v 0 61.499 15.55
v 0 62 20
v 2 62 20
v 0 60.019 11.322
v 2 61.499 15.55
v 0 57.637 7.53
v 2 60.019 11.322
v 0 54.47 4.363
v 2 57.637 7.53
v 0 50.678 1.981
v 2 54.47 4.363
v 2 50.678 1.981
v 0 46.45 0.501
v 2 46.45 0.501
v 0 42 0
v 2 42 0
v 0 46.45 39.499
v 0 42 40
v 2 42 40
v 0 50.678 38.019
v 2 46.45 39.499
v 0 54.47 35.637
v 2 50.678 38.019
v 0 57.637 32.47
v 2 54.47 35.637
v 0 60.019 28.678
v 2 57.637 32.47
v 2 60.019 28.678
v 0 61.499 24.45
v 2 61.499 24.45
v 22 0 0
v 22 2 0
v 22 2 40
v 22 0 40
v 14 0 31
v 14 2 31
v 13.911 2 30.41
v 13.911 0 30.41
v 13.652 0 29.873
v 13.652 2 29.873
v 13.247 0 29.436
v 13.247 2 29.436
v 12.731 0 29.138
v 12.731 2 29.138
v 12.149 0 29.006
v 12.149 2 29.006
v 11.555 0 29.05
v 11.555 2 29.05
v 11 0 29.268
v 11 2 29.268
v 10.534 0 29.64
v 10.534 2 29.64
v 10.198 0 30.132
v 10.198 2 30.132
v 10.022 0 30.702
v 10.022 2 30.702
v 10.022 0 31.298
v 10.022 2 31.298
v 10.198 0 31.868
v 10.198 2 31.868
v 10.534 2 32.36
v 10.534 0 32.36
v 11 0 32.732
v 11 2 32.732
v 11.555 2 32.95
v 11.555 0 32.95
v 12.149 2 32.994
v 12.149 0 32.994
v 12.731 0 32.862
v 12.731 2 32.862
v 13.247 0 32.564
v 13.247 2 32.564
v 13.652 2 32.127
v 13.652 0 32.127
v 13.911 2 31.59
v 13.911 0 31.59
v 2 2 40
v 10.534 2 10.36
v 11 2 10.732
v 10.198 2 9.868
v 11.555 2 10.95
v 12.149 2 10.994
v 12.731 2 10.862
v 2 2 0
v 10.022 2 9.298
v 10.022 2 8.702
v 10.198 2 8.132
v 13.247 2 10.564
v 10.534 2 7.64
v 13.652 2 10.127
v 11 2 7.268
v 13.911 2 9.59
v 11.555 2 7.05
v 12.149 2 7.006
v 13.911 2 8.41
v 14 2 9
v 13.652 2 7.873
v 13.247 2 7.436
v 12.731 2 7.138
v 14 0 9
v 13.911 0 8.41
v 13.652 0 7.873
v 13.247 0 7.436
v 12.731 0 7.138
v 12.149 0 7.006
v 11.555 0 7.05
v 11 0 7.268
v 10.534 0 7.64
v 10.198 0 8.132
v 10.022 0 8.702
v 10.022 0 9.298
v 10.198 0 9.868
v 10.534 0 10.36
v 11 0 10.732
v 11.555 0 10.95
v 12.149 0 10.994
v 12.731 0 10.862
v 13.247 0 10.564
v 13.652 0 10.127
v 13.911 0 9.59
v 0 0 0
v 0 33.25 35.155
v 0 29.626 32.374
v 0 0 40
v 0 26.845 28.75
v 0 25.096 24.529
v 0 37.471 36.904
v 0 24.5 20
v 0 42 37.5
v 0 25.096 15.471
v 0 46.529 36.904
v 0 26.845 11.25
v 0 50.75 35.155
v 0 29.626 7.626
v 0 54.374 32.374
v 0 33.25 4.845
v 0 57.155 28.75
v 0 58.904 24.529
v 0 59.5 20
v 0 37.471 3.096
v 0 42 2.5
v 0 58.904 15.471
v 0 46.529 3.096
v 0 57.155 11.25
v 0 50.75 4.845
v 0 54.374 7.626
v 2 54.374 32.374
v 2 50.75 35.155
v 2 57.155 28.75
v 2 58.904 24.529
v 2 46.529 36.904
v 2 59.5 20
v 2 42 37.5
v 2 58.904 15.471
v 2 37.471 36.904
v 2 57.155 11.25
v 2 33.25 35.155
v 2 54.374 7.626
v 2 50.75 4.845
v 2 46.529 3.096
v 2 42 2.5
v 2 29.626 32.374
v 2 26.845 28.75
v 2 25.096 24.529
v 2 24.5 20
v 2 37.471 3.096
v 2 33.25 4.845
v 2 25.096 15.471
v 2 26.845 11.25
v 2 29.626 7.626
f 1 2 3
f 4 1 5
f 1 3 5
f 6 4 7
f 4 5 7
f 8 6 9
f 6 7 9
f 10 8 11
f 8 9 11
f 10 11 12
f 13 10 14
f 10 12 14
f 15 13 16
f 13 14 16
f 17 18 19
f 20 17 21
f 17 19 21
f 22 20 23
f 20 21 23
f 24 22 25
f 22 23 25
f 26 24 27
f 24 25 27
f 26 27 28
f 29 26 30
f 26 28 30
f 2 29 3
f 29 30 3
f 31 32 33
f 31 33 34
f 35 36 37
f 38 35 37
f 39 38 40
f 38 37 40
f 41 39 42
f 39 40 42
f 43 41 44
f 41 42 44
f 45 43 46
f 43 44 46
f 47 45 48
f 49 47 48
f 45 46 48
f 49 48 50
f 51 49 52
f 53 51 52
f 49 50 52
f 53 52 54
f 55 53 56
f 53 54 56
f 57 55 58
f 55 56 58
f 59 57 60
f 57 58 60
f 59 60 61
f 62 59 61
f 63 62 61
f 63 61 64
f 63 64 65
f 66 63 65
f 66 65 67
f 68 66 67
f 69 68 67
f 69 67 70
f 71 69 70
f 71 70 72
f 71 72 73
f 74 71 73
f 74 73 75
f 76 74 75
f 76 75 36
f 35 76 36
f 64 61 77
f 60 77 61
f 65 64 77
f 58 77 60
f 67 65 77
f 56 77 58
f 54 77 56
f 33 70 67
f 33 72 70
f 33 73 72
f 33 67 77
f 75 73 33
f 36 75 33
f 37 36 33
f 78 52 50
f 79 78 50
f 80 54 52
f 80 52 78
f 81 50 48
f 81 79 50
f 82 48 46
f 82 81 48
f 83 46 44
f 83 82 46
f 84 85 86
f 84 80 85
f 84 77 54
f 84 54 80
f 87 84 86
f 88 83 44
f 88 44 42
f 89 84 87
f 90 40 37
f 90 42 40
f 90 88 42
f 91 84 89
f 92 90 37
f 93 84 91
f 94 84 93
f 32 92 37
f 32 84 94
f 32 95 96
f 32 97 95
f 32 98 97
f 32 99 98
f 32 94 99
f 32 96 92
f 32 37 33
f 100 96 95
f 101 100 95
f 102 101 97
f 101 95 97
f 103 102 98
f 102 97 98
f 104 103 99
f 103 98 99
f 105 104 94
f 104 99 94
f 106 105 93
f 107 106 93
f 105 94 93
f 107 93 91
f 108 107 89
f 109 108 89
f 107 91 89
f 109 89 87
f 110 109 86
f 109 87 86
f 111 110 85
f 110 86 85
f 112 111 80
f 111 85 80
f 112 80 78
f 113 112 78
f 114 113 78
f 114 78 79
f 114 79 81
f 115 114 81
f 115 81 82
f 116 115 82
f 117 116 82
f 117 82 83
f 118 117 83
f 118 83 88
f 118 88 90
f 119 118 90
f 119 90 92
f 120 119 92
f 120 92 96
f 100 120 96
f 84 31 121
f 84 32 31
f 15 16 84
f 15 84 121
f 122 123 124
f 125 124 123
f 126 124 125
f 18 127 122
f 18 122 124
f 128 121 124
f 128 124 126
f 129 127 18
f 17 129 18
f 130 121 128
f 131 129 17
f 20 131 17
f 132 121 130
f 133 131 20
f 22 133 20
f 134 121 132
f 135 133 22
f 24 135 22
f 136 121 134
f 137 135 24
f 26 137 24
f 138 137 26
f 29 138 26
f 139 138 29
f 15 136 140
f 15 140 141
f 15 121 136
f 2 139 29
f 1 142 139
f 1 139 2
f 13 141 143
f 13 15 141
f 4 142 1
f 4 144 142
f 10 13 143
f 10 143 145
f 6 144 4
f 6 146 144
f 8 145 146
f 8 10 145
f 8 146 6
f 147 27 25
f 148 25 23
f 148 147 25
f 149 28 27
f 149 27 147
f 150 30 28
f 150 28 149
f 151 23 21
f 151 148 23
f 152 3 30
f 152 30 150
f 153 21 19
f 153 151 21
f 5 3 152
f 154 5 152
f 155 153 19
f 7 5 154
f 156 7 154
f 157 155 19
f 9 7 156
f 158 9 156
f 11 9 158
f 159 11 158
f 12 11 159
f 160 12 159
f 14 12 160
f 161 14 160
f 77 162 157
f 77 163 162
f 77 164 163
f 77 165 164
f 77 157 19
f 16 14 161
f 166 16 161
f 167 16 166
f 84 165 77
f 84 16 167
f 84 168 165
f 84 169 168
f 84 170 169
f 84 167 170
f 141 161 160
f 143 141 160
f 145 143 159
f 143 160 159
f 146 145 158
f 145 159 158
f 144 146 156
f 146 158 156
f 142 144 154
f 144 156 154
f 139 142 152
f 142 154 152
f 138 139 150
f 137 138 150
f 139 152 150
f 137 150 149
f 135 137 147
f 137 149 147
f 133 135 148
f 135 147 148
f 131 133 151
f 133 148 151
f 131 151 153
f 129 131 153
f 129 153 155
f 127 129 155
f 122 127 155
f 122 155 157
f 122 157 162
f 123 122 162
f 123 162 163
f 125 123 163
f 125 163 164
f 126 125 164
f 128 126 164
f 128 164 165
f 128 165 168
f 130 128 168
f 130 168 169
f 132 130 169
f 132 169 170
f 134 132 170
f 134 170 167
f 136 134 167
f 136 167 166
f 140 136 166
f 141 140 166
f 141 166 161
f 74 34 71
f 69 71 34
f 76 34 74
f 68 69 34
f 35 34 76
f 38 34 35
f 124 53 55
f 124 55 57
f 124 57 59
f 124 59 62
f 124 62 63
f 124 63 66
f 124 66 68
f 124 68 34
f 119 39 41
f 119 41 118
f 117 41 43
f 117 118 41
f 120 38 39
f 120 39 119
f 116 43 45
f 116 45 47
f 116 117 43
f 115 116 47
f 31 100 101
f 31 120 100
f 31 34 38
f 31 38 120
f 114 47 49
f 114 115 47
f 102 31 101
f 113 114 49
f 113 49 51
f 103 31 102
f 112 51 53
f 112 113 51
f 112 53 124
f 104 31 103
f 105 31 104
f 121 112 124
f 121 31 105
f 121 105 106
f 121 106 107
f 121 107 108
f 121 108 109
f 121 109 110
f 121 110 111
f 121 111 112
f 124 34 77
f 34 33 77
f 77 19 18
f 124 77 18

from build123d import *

# Parameters (mm, degrees)
BOSS_EXTRUDE1_DEPTH = 40
CUT_EXTRUDE1_REACH  = 4
SKETCH2_R           = 17.5
CUT_EXTRUDE2_REACH  = 4
CUT_EXTRUDE3_REACH  = 4
SKETCH6_R           = 2


with BuildPart() as part:
    # Sketch1 → Boss-Extrude1 (new body)
    with BuildSketch(Plane.XY):
        Polygon((0, 0), (0, 62), (2, 62), (2, 2), (22, 2), (22, 0), align=None)
    extrude(amount=BOSS_EXTRUDE1_DEPTH)

    # Sketch2 → Cut-Extrude1 (cut, up to next)
    with BuildSketch(Plane(origin=(2, 0, 0), x_dir=(0, 0, -1), z_dir=(1, 0, 0)), mode=Mode.PRIVATE) as cut_extrude1_sk1:
        with Locations((-20, 42)):
            Circle(SKETCH2_R)
    cut_extrude1_tool1 = extrude(cut_extrude1_sk1.sketch, amount=-CUT_EXTRUDE1_REACH, mode=Mode.PRIVATE) & part.part
    add(cut_extrude1_tool1.solids().sort_by_distance((2, 42, 20))[0], mode=Mode.SUBTRACT)

    # Sketch5 → Cut-Extrude2 (cut, up to next)
    with BuildSketch(Plane(origin=(2, 0, 0), x_dir=(0, 0, -1), z_dir=(1, 0, 0)), mode=Mode.PRIVATE) as cut_extrude2_sk1:
        with BuildLine():
            Line((-40, 62), (-40, 42))
            ThreePointArc((-40, 42), (-34.142135624, 56.142135624), (-20, 62))
            Line((-20, 62), (-40, 62))
        make_face()
    cut_extrude2_tool1 = extrude(cut_extrude2_sk1.sketch, amount=-CUT_EXTRUDE2_REACH, mode=Mode.PRIVATE) & part.part
    add(cut_extrude2_tool1.solids().sort_by_distance((2, 57.532641, 35.532641))[0], mode=Mode.SUBTRACT)
    # Sketch5 → Cut-Extrude2 (cut, up to next)
    with BuildSketch(Plane(origin=(2, 0, 0), x_dir=(0, 0, -1), z_dir=(1, 0, 0)), mode=Mode.PRIVATE) as cut_extrude2_sk2:
        with BuildLine():
            Line((0, 62), (-20, 62))
            ThreePointArc((-20, 62), (-5.857864376, 56.142135624), (0, 42))
            Line((0, 42), (0, 62))
        make_face()
    cut_extrude2_tool2 = extrude(cut_extrude2_sk2.sketch, amount=-CUT_EXTRUDE2_REACH, mode=Mode.PRIVATE) & part.part
    add(cut_extrude2_tool2.solids().sort_by_distance((2, 57.532641, 4.467359))[0], mode=Mode.SUBTRACT)

    # Sketch6 → Cut-Extrude3 (cut, up to next)
    with BuildSketch(Plane(origin=(0, 2, 0), x_dir=(1, 0, 0), z_dir=(0, 1, 0)), mode=Mode.PRIVATE) as cut_extrude3_sk1:
        with Locations((12, -9)):
            Circle(SKETCH6_R)
    cut_extrude3_tool1 = extrude(cut_extrude3_sk1.sketch, amount=-CUT_EXTRUDE3_REACH, mode=Mode.PRIVATE) & part.part
    add(cut_extrude3_tool1.solids().sort_by_distance((12, 2, 9))[0], mode=Mode.SUBTRACT)
    # Sketch6 → Cut-Extrude3 (cut, up to next)
    with BuildSketch(Plane(origin=(0, 2, 0), x_dir=(1, 0, 0), z_dir=(0, 1, 0)), mode=Mode.PRIVATE) as cut_extrude3_sk2:
        with Locations((12, -31)):
            Circle(SKETCH6_R)
    cut_extrude3_tool2 = extrude(cut_extrude3_sk2.sketch, amount=-CUT_EXTRUDE3_REACH, mode=Mode.PRIVATE) & part.part
    add(cut_extrude3_tool2.solids().sort_by_distance((12, 2, 31))[0], mode=Mode.SUBTRACT)


solid = part.part
